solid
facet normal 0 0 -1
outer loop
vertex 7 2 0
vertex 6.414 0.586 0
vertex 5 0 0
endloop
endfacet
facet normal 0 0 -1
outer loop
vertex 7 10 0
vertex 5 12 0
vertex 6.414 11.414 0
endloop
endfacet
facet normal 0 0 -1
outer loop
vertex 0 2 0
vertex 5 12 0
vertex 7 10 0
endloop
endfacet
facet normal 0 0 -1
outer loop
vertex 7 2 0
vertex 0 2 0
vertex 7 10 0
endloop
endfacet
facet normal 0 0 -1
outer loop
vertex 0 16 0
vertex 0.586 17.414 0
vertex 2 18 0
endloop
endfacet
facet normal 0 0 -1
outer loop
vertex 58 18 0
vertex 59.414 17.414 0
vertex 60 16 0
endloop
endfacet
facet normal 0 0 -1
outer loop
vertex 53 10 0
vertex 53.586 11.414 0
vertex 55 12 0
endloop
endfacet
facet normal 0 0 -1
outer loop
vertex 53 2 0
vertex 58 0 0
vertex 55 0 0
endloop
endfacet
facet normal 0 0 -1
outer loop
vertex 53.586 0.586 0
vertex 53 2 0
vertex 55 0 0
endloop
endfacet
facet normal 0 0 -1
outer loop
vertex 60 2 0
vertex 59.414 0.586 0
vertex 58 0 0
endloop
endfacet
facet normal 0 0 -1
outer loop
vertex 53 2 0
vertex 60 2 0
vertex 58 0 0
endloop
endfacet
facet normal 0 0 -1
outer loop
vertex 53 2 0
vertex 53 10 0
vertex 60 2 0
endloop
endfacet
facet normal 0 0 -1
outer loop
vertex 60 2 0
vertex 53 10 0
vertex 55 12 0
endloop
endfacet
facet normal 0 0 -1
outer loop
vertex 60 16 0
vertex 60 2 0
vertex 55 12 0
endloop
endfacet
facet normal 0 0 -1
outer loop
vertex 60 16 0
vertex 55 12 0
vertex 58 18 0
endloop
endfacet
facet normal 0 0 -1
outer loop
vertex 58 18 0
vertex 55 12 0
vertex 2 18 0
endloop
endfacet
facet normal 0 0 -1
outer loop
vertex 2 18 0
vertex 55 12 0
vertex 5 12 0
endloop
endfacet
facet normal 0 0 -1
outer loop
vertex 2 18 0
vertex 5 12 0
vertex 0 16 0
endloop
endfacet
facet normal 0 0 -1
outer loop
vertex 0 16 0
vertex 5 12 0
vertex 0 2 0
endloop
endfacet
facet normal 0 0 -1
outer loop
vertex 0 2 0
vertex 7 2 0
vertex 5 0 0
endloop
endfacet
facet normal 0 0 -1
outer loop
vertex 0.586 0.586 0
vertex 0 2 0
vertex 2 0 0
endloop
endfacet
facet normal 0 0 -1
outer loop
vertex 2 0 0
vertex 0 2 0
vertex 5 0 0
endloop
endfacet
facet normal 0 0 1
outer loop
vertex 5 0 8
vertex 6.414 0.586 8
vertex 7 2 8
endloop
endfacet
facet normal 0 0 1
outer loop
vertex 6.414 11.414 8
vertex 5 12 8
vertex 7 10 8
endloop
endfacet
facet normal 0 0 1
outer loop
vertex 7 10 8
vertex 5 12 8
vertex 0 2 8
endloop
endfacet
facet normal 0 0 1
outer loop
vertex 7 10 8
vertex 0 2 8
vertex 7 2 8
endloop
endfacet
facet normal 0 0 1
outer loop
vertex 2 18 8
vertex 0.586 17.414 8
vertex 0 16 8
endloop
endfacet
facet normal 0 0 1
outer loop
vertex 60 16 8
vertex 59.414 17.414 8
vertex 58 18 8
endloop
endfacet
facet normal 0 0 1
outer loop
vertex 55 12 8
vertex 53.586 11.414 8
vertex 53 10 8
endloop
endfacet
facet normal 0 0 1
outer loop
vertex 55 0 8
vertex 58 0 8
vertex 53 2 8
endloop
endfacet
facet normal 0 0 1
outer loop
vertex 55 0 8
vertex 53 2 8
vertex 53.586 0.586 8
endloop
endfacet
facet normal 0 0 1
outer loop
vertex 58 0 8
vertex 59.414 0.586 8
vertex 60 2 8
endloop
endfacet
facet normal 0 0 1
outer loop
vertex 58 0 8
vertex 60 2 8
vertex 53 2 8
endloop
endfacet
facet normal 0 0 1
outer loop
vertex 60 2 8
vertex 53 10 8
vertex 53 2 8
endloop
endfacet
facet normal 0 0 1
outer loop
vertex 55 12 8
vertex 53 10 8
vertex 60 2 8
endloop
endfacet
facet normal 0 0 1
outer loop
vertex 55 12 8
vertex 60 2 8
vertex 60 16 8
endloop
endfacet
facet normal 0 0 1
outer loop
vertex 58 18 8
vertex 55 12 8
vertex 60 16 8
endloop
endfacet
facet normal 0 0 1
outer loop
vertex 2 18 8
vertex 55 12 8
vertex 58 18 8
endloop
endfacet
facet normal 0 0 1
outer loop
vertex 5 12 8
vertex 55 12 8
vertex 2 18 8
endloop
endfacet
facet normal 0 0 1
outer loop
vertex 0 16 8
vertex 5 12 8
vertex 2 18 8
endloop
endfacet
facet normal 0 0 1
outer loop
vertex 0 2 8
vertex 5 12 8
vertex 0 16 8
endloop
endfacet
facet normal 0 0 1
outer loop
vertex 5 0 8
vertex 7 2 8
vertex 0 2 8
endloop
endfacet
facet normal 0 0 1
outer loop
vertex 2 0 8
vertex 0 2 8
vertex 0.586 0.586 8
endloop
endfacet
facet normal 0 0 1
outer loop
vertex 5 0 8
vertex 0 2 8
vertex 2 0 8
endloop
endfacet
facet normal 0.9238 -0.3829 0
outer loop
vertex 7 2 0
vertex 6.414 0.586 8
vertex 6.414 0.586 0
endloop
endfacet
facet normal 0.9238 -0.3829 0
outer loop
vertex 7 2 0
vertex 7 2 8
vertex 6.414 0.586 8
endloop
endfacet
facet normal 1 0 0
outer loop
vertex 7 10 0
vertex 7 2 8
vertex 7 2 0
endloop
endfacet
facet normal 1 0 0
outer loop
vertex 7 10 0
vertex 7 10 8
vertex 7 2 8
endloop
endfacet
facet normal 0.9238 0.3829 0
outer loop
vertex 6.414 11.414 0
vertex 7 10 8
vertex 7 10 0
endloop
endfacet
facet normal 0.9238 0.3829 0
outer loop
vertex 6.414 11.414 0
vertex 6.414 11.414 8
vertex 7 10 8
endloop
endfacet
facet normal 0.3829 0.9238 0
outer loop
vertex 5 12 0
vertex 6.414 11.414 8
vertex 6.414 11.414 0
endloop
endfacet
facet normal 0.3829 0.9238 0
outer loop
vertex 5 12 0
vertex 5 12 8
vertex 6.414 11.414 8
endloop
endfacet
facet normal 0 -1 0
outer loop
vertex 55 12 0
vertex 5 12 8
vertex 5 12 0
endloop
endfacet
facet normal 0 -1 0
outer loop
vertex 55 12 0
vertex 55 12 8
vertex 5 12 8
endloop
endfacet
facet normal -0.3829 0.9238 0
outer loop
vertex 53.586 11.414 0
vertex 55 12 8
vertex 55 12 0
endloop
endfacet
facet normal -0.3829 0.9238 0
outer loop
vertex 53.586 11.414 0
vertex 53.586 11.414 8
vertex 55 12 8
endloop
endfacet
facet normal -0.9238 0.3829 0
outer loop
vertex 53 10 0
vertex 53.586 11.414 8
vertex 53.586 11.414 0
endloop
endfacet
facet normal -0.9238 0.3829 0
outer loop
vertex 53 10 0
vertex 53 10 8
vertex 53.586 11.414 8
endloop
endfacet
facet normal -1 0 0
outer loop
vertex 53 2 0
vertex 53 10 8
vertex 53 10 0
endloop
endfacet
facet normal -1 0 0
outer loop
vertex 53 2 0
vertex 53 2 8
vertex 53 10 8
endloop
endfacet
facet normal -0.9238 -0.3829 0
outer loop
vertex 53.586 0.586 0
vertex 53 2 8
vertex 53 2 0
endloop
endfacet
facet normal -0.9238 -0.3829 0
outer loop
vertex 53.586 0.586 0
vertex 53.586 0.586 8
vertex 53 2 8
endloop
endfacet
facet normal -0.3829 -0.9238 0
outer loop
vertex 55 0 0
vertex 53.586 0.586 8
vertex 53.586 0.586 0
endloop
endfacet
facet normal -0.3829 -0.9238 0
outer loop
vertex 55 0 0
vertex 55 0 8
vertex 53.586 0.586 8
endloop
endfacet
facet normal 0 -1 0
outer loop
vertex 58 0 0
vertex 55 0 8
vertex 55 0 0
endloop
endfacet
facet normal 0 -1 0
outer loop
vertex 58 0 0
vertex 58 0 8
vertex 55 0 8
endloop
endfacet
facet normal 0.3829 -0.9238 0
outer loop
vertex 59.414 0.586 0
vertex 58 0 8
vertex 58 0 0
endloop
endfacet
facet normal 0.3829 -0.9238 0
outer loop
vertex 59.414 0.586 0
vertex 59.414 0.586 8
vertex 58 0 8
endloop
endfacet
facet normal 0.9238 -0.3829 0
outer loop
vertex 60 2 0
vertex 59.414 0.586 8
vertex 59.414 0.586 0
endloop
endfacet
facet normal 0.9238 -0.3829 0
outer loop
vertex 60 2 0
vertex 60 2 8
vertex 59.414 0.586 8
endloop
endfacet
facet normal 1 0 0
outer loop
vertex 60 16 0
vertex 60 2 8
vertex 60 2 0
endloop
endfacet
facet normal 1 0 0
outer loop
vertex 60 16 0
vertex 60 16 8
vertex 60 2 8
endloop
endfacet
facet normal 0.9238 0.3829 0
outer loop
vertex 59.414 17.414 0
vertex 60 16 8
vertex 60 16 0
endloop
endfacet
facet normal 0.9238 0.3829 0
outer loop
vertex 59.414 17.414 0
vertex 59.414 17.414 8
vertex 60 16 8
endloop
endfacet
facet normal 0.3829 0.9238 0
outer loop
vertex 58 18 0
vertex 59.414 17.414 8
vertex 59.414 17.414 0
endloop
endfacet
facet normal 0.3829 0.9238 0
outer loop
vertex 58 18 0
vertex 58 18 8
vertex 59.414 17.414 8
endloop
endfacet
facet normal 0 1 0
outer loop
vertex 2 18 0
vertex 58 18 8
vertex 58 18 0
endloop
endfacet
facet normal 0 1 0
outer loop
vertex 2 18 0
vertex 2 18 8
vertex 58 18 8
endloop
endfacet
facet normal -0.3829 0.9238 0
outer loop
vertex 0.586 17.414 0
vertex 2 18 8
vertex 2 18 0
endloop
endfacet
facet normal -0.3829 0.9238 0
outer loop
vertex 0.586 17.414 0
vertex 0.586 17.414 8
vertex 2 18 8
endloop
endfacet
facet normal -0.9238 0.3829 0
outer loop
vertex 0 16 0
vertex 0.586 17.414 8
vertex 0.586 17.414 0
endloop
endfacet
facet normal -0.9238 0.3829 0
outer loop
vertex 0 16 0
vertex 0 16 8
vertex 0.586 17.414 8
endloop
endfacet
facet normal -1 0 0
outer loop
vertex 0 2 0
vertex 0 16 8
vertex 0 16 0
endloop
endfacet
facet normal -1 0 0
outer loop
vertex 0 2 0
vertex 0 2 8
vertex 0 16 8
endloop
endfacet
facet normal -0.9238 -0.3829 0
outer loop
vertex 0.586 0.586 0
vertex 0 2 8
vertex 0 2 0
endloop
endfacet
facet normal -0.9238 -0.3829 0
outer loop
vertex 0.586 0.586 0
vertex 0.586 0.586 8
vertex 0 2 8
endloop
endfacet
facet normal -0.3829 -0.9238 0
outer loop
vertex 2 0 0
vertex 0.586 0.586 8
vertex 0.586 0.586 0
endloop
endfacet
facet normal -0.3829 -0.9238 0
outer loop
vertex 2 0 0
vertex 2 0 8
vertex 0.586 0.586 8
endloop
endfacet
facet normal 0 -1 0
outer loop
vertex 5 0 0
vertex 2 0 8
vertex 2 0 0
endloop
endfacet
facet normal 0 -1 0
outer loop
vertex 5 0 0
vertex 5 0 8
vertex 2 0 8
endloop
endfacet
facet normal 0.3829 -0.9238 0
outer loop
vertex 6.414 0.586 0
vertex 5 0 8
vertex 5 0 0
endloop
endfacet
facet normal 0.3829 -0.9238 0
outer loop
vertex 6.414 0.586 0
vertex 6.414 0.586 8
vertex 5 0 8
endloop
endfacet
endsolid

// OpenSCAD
$fn = 32;

// ----------------------------------------------------------------------
// Clip blank: staple clip, 8 mm thick
// ----------------------------------------------------------------------

// --- parameters (mm) ---
profile_height = 8;       // extrusion height
profile_points = 24;      // points of the closed outline

profile = [[0, 2], [0.586, 0.586], [2, 0], [5, 0], [6.414, 0.586], [7, 2], [7, 10], [6.414, 11.414], [5, 12], [55, 12], [53.586, 11.414], [53, 10], [53, 2], [53.586, 0.586], [55, 0], [58, 0], [59.414, 0.586], [60, 2], [60, 16], [59.414, 17.414], [58, 18], [2, 18], [0.586, 17.414], [0, 16]];  // single closed polygon, 24 points, counter clockwise

// --- the one profile operation ---
linear_extrude(height = profile_height) polygon(points = profile);
